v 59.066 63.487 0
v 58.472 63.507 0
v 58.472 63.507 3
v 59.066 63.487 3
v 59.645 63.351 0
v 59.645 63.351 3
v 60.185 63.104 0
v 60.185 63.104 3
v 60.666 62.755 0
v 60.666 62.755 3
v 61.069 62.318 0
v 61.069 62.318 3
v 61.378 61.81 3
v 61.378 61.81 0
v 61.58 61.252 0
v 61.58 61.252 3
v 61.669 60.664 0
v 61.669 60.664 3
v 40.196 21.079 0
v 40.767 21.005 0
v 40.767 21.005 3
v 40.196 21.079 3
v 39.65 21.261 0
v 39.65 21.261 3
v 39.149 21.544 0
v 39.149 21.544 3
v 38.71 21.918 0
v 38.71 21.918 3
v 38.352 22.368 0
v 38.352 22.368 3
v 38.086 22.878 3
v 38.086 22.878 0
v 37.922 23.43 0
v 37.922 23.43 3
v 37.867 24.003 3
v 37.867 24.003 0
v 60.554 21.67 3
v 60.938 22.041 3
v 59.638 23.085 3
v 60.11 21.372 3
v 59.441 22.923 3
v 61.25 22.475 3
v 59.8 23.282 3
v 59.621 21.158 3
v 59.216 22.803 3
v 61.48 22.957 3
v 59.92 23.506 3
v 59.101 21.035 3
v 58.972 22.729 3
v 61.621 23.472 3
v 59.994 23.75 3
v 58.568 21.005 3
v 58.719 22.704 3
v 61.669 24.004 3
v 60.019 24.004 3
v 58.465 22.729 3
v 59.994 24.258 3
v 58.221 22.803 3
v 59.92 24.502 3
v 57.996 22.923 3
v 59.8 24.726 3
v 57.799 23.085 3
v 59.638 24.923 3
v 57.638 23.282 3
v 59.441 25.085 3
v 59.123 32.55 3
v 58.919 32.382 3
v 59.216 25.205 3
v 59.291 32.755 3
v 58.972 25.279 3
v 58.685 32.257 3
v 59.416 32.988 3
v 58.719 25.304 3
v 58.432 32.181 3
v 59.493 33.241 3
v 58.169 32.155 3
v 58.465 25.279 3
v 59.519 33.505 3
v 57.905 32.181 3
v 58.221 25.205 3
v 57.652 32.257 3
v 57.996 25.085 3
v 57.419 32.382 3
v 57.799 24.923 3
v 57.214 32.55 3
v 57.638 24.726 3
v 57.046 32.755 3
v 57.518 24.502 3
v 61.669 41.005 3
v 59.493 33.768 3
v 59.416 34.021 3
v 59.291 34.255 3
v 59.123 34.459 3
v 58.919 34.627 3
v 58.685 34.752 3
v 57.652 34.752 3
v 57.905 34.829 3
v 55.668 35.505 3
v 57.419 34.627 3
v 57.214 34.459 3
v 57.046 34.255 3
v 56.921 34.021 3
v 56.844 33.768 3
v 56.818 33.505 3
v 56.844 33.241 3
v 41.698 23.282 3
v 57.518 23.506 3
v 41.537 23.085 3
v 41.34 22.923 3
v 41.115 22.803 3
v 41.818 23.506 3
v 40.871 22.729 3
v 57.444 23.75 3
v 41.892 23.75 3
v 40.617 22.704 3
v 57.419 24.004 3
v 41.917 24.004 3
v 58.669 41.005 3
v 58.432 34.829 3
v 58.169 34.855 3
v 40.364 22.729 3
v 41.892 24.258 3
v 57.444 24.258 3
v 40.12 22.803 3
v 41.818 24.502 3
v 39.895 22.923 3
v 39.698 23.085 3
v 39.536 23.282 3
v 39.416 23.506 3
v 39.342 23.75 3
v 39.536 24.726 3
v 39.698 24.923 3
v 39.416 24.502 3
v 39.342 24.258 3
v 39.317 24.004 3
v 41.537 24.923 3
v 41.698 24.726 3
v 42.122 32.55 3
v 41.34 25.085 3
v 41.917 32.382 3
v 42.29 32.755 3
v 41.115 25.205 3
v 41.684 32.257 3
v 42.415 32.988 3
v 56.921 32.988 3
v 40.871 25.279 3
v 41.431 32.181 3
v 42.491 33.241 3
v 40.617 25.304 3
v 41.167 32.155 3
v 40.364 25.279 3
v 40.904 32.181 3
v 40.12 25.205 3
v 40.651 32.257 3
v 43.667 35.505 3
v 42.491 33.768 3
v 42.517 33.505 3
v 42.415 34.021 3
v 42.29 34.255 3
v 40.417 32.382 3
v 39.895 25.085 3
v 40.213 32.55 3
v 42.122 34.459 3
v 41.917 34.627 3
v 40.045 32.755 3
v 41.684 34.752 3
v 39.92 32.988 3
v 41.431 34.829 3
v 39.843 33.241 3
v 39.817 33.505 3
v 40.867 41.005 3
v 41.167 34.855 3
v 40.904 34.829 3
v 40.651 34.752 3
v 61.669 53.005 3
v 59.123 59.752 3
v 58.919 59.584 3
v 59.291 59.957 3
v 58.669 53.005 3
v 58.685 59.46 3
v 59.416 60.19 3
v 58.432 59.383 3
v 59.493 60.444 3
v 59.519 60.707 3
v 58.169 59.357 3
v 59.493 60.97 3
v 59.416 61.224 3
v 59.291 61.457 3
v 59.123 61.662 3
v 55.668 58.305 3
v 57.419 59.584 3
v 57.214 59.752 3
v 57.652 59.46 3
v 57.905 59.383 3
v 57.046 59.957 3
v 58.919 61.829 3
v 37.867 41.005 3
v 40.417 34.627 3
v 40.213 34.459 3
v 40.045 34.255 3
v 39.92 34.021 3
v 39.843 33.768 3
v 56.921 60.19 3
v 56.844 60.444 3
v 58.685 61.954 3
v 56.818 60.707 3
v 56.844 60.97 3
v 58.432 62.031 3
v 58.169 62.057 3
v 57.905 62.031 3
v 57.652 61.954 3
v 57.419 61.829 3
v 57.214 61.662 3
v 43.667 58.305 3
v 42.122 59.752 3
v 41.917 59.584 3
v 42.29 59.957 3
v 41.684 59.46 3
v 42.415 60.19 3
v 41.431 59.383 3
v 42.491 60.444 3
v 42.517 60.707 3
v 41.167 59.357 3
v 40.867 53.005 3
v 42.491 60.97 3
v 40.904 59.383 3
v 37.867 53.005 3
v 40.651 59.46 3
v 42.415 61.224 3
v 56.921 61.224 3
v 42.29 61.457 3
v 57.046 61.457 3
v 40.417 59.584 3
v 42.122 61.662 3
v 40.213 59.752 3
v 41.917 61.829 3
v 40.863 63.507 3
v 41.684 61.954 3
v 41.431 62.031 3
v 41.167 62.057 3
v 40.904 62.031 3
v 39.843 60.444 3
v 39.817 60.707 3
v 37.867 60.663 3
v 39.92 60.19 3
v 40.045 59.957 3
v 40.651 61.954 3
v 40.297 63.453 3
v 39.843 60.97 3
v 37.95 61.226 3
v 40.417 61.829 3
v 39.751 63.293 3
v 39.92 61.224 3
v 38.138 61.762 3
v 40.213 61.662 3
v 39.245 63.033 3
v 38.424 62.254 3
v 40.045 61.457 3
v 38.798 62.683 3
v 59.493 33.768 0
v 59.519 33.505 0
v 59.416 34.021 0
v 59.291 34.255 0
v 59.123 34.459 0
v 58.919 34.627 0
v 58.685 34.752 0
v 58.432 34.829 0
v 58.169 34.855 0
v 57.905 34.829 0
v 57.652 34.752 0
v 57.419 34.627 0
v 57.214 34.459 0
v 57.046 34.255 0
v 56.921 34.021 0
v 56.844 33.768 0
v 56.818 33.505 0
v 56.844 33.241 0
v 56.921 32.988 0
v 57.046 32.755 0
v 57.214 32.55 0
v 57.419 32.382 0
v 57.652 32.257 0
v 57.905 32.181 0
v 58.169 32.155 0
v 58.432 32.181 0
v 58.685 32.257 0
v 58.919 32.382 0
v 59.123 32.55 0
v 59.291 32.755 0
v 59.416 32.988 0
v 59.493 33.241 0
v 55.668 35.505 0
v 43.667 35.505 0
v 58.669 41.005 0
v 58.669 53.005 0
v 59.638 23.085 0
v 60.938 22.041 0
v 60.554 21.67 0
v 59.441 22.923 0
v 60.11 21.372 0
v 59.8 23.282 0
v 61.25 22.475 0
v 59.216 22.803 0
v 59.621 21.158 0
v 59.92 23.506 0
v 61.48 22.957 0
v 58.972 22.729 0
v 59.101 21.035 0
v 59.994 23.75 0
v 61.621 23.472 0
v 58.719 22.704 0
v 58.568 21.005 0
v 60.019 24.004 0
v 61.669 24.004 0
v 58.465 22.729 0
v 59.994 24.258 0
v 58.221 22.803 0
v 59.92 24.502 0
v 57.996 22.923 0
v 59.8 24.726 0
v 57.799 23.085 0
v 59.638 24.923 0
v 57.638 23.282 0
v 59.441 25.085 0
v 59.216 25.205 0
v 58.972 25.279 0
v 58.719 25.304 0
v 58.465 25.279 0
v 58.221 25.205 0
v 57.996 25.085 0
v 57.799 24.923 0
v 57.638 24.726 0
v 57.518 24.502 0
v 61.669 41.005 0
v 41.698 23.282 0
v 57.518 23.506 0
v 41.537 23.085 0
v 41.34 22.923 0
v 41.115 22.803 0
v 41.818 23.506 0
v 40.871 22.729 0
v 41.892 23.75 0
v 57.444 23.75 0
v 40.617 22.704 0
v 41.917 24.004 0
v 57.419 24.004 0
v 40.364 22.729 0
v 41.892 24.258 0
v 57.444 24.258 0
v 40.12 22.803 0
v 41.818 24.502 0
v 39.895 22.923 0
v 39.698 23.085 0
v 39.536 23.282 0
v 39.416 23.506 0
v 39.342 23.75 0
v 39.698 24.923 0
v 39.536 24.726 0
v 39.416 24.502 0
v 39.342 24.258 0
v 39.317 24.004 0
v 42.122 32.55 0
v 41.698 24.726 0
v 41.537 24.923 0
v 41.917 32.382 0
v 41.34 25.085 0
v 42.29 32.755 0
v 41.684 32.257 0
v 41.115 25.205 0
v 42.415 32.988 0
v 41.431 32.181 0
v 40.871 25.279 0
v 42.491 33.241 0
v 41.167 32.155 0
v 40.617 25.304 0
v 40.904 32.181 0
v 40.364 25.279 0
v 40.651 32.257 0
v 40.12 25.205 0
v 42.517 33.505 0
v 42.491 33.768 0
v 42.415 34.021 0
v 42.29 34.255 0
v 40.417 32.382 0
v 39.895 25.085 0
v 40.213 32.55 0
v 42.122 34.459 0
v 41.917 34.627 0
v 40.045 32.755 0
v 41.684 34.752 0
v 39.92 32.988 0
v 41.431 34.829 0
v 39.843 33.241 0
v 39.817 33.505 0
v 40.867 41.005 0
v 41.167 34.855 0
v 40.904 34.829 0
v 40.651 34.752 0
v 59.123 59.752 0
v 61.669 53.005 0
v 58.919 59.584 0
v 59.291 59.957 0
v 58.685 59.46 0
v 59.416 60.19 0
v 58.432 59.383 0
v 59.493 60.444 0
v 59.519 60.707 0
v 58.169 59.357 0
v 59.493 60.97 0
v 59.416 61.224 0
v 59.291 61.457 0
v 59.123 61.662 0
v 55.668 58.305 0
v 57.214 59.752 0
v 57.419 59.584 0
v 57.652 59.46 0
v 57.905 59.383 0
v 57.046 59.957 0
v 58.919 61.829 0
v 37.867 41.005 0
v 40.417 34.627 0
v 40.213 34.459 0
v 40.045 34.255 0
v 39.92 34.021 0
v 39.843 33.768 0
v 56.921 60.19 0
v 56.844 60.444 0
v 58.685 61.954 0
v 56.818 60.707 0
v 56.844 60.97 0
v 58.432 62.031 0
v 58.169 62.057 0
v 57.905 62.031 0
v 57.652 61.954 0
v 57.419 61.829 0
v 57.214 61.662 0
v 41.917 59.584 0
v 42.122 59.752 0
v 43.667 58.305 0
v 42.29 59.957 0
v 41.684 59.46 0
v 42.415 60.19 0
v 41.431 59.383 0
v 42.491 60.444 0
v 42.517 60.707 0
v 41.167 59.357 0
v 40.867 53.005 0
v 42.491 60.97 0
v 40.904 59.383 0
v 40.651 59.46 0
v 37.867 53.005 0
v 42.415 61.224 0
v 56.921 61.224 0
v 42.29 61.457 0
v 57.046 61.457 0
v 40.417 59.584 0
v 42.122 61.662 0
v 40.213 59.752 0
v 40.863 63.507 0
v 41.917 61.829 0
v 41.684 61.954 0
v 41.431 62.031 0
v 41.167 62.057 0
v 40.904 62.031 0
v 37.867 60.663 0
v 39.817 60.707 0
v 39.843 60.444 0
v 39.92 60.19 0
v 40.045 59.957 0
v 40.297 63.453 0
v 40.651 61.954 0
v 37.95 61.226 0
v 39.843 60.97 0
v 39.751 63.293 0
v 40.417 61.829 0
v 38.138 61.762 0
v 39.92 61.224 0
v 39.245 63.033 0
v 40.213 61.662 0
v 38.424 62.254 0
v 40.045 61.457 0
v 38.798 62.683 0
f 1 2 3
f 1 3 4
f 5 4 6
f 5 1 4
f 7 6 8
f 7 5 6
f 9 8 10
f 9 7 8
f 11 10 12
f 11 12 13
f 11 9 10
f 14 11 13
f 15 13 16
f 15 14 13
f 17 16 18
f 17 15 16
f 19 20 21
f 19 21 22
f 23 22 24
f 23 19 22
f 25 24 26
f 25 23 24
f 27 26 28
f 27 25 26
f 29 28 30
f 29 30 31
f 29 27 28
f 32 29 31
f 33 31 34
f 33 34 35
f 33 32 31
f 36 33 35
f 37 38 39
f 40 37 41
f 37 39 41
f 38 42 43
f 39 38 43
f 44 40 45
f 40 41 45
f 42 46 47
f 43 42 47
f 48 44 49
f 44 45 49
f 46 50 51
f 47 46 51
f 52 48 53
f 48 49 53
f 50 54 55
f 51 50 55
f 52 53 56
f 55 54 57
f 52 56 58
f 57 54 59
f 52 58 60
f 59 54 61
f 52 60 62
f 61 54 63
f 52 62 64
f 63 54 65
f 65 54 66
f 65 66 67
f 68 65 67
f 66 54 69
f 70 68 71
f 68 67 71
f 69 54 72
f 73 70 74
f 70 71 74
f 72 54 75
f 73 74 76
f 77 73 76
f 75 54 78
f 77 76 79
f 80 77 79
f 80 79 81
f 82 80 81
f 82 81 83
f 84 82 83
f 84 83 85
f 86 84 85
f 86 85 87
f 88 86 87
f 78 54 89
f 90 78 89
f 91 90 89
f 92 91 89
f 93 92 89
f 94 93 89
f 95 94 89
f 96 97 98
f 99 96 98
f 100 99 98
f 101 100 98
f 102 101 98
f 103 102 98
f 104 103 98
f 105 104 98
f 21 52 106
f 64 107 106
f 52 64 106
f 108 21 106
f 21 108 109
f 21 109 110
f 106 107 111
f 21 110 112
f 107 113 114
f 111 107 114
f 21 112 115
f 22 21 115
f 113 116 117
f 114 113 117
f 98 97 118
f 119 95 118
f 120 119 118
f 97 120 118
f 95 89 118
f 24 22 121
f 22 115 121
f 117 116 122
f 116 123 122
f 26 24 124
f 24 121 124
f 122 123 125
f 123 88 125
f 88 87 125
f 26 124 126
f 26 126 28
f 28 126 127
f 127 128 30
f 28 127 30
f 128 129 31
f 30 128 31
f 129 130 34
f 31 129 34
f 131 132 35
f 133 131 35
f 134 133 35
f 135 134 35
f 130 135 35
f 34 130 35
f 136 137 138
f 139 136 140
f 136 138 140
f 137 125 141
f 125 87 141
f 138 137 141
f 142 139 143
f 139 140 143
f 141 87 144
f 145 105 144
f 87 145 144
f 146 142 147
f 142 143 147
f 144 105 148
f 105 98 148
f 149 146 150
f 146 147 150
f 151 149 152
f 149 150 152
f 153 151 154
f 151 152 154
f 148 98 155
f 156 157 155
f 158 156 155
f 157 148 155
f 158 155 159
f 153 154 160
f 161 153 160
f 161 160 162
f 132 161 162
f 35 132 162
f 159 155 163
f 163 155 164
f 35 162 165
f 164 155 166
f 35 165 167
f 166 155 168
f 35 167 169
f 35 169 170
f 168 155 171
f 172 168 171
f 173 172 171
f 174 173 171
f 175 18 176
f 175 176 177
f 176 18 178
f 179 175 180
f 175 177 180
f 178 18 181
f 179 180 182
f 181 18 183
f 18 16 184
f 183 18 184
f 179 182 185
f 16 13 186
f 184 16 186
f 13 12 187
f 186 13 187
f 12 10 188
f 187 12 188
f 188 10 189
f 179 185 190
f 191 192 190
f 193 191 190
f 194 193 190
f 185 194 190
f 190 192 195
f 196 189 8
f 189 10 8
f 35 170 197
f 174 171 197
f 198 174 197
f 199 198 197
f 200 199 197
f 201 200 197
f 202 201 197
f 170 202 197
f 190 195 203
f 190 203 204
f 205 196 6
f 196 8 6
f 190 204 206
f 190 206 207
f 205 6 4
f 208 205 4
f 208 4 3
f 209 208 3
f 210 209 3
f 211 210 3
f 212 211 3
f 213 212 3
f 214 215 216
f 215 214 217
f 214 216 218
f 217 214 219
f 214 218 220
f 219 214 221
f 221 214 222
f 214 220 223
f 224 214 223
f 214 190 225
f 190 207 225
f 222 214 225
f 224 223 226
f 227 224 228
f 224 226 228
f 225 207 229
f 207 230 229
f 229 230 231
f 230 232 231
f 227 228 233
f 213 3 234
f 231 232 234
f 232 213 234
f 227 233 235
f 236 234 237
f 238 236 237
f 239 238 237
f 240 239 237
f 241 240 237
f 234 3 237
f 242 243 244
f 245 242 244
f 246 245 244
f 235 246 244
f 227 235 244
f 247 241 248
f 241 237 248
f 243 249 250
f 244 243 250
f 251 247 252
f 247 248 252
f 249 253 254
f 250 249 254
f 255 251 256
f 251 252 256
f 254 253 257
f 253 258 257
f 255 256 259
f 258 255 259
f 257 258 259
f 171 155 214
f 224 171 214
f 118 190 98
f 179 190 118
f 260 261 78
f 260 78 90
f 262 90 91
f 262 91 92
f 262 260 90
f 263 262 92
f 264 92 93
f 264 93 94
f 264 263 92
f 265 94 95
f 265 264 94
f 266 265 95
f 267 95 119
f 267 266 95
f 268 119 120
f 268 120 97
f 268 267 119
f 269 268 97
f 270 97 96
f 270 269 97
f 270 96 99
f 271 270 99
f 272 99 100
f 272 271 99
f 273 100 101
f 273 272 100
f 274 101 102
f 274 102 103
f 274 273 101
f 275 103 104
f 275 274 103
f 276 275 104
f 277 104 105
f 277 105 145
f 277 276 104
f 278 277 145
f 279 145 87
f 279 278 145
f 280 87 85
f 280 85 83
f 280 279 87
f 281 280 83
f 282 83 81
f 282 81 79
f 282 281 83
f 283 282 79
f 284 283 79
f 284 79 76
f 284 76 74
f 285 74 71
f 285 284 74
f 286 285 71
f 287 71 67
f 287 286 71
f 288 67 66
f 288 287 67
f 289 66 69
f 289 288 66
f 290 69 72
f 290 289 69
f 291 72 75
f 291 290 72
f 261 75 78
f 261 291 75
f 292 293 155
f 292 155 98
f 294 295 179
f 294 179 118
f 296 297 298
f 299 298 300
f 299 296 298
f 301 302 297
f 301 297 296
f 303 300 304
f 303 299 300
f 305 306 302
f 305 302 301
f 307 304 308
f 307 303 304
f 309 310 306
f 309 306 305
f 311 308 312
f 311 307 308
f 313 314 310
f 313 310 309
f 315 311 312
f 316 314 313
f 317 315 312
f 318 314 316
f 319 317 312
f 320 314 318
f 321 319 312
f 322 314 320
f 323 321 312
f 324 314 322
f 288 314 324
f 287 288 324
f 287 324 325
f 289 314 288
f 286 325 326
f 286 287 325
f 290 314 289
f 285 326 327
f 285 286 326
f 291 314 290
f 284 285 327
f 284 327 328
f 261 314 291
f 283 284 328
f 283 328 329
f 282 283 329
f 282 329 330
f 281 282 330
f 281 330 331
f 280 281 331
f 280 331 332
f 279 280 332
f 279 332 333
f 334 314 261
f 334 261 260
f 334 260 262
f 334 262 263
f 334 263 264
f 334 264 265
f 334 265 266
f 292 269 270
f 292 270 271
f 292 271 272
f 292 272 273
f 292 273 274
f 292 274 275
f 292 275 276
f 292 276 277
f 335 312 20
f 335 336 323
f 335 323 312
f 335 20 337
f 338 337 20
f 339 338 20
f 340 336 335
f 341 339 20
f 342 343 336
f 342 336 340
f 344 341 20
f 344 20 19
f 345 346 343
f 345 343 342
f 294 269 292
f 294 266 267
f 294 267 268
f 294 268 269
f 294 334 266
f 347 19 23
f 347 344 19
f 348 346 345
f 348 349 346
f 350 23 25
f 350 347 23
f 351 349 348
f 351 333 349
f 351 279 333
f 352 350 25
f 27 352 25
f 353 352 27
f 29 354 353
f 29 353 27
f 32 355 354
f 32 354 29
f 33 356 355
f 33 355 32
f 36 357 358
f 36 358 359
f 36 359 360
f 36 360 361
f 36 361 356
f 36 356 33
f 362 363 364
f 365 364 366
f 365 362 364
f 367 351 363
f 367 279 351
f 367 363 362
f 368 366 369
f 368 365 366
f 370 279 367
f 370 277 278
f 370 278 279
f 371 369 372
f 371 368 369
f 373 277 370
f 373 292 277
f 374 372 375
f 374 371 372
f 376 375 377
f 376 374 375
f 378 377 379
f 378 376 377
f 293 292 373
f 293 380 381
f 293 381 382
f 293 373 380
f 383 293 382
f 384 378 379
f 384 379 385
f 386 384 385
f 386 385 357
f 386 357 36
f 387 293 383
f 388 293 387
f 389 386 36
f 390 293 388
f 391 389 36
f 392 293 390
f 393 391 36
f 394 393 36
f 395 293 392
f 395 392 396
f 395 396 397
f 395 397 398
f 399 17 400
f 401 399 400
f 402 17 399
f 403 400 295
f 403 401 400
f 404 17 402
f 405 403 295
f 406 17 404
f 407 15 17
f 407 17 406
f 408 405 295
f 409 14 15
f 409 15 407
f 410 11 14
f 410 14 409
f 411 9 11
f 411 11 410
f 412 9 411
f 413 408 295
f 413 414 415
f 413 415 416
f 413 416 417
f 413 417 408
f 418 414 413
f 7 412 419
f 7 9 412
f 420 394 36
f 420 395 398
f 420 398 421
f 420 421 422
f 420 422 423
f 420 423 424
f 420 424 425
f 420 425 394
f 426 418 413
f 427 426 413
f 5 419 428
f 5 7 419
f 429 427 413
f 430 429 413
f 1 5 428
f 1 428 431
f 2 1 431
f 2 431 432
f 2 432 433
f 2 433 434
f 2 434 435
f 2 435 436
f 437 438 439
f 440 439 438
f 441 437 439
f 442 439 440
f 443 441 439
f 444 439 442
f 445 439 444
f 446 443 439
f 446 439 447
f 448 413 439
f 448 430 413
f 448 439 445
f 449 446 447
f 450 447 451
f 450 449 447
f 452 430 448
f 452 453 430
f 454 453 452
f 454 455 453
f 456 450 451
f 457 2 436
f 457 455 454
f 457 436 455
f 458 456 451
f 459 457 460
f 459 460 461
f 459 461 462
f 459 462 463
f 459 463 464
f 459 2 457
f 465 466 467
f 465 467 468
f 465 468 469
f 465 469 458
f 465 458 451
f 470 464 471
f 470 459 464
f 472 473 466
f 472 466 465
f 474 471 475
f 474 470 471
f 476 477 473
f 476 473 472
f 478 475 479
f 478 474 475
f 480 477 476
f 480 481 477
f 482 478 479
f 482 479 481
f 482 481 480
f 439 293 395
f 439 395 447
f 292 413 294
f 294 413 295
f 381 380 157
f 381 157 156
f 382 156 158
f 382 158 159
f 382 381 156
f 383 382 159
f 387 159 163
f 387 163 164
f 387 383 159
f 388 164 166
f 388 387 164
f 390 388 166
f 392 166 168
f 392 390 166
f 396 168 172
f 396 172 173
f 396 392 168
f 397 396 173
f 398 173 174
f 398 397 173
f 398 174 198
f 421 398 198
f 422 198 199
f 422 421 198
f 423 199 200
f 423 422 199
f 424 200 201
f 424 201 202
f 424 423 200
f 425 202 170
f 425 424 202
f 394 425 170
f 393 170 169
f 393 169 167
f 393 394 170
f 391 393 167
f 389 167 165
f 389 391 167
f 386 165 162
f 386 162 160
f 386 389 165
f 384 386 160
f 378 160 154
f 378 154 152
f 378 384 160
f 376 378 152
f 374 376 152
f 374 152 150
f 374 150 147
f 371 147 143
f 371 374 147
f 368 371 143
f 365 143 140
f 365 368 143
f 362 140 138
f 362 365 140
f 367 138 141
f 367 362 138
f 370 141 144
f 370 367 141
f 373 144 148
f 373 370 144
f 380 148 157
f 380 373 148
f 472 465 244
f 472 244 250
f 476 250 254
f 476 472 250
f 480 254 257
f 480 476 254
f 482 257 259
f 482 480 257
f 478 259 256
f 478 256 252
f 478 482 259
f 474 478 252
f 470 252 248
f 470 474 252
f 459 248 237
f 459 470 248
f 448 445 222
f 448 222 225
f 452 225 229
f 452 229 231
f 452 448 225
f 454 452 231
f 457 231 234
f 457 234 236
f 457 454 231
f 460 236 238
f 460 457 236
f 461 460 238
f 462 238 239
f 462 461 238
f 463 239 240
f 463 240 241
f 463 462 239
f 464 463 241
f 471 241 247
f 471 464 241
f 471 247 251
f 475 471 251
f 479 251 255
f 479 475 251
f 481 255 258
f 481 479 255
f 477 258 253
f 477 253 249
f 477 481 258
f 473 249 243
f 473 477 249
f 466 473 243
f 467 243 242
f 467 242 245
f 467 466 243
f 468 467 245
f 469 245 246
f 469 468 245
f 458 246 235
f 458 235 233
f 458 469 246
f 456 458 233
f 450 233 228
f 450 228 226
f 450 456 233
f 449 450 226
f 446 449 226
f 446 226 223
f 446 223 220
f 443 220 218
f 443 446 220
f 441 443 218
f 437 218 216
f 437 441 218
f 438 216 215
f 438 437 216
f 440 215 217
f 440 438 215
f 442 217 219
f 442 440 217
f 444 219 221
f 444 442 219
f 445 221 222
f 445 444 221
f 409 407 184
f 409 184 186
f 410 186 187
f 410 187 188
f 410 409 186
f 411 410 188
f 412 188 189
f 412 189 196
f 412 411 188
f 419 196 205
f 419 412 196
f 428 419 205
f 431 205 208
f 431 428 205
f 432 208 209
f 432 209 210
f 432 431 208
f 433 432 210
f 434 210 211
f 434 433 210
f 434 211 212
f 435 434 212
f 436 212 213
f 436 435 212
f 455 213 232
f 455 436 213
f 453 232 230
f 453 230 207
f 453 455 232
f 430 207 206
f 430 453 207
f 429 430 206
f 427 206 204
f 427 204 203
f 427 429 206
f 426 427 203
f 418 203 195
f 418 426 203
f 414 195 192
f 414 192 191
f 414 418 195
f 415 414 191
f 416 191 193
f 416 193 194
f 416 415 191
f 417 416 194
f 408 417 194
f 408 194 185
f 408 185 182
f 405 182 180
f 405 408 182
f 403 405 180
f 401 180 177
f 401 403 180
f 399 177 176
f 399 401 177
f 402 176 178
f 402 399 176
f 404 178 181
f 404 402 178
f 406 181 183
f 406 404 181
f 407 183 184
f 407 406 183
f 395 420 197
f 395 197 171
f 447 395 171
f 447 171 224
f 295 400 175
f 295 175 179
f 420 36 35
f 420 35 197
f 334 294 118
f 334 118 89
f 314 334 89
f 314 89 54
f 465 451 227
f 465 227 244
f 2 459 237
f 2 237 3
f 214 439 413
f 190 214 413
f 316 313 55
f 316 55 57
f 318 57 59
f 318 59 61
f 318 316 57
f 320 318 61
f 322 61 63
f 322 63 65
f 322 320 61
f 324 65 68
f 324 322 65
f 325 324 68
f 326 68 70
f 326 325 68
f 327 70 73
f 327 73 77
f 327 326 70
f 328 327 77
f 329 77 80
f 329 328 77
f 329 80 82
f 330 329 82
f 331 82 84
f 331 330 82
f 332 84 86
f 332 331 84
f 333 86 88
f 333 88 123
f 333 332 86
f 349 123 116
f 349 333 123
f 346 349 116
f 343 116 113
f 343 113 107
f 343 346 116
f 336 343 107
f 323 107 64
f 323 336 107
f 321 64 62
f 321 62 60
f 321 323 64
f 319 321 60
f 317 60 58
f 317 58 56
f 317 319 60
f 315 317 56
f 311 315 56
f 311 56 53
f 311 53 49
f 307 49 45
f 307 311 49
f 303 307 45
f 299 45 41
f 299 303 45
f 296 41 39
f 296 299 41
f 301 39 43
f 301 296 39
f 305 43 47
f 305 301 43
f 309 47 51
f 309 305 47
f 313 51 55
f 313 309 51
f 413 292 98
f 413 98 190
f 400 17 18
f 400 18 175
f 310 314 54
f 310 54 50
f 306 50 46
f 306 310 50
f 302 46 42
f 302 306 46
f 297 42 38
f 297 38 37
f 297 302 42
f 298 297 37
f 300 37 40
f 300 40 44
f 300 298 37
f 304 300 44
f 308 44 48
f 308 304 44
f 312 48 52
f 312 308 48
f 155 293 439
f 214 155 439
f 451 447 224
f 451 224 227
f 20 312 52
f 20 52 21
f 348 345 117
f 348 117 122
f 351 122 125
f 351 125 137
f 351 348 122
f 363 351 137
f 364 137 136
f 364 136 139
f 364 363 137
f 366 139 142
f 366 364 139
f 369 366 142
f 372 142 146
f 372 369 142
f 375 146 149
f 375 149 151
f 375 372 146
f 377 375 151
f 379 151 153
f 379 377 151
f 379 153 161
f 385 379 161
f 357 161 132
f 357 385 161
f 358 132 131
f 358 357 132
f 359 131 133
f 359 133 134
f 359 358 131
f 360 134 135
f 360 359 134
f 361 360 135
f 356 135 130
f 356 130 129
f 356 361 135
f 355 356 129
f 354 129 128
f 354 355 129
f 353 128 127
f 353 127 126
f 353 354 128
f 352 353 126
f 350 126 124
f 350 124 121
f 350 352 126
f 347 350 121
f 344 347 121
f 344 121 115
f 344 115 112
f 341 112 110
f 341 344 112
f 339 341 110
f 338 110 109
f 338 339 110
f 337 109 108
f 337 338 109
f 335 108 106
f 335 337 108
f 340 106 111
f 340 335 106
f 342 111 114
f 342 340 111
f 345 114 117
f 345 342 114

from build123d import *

# Parameters (mm, degrees)
MODEL_R             = 1.350108094
MODEL_R_2           = 1.30010409
MODEL_W             = 12.000960833
MODEL_H             = 22.8
BOSS_EXTRUDE1_DEPTH = 3


with BuildPart() as part:
    # Model → Boss-Extrude1 (new body)
    with BuildSketch(Plane.XY):
        with BuildLine():
            Line((58.668697195, 41.004775949), (61.668697195, 41.004775949))
            Line((61.668697195, 41.004775949), (61.668697195, 24.003921827))
            ThreePointArc((61.668697195, 24.003921827), (60.754304786, 21.847009523), (58.568180571, 21.004842626))
            Line((58.568180571, 21.004842626), (40.767051953, 21.004842626))
            ThreePointArc((40.767051953, 21.004842626), (38.710492919, 21.917586858), (37.866775535, 24.003414768))
            Line((37.866775535, 24.003414768), (37.866775535, 41.004775949))
            Line((37.866775535, 41.004775949), (40.867015743, 41.004775949))
            Line((40.867015743, 41.004775949), (40.867015743, 53.004775949))
            Line((40.867015743, 53.004775949), (37.866775535, 53.004775949))
            Line((37.866775535, 53.004775949), (37.866775535, 60.663449882))
            ThreePointArc((37.866775535, 60.663449882), (38.797636626, 62.682660658), (40.862794137, 63.506577512))
            Line((40.862794137, 63.506577512), (58.472438386, 63.506577512))
            ThreePointArc((58.472438386, 63.506577512), (60.66612789, 62.754918404), (61.668697195, 60.663956941))
            Line((61.668697195, 60.663956941), (61.668697195, 53.004775949))
            Line((61.668697195, 53.004775949), (58.668697195, 53.004775949))
            Line((58.668697195, 53.004775949), (58.668697195, 41.004775949))
        make_face()
        with Locations((41.167245975, 60.70691038)):
            Circle(MODEL_R, mode=Mode.SUBTRACT)
        with Locations((58.168607156, 60.70691038)):
            Circle(MODEL_R, mode=Mode.SUBTRACT)
        with Locations((41.167245975, 33.504732491)):
            Circle(MODEL_R, mode=Mode.SUBTRACT)
        with Locations((58.168607156, 33.504732491)):
            Circle(MODEL_R, mode=Mode.SUBTRACT)
        with Locations((40.617301942, 24.003971828)):
            Circle(MODEL_R_2, mode=Mode.SUBTRACT)
        with Locations((58.718751199, 24.003971828)):
            Circle(MODEL_R_2, mode=Mode.SUBTRACT)
        with Locations((49.667616262, 46.904842626)):
            Rectangle(MODEL_W, MODEL_H, mode=Mode.SUBTRACT)
    extrude(amount=BOSS_EXTRUDE1_DEPTH)


solid = part.part
